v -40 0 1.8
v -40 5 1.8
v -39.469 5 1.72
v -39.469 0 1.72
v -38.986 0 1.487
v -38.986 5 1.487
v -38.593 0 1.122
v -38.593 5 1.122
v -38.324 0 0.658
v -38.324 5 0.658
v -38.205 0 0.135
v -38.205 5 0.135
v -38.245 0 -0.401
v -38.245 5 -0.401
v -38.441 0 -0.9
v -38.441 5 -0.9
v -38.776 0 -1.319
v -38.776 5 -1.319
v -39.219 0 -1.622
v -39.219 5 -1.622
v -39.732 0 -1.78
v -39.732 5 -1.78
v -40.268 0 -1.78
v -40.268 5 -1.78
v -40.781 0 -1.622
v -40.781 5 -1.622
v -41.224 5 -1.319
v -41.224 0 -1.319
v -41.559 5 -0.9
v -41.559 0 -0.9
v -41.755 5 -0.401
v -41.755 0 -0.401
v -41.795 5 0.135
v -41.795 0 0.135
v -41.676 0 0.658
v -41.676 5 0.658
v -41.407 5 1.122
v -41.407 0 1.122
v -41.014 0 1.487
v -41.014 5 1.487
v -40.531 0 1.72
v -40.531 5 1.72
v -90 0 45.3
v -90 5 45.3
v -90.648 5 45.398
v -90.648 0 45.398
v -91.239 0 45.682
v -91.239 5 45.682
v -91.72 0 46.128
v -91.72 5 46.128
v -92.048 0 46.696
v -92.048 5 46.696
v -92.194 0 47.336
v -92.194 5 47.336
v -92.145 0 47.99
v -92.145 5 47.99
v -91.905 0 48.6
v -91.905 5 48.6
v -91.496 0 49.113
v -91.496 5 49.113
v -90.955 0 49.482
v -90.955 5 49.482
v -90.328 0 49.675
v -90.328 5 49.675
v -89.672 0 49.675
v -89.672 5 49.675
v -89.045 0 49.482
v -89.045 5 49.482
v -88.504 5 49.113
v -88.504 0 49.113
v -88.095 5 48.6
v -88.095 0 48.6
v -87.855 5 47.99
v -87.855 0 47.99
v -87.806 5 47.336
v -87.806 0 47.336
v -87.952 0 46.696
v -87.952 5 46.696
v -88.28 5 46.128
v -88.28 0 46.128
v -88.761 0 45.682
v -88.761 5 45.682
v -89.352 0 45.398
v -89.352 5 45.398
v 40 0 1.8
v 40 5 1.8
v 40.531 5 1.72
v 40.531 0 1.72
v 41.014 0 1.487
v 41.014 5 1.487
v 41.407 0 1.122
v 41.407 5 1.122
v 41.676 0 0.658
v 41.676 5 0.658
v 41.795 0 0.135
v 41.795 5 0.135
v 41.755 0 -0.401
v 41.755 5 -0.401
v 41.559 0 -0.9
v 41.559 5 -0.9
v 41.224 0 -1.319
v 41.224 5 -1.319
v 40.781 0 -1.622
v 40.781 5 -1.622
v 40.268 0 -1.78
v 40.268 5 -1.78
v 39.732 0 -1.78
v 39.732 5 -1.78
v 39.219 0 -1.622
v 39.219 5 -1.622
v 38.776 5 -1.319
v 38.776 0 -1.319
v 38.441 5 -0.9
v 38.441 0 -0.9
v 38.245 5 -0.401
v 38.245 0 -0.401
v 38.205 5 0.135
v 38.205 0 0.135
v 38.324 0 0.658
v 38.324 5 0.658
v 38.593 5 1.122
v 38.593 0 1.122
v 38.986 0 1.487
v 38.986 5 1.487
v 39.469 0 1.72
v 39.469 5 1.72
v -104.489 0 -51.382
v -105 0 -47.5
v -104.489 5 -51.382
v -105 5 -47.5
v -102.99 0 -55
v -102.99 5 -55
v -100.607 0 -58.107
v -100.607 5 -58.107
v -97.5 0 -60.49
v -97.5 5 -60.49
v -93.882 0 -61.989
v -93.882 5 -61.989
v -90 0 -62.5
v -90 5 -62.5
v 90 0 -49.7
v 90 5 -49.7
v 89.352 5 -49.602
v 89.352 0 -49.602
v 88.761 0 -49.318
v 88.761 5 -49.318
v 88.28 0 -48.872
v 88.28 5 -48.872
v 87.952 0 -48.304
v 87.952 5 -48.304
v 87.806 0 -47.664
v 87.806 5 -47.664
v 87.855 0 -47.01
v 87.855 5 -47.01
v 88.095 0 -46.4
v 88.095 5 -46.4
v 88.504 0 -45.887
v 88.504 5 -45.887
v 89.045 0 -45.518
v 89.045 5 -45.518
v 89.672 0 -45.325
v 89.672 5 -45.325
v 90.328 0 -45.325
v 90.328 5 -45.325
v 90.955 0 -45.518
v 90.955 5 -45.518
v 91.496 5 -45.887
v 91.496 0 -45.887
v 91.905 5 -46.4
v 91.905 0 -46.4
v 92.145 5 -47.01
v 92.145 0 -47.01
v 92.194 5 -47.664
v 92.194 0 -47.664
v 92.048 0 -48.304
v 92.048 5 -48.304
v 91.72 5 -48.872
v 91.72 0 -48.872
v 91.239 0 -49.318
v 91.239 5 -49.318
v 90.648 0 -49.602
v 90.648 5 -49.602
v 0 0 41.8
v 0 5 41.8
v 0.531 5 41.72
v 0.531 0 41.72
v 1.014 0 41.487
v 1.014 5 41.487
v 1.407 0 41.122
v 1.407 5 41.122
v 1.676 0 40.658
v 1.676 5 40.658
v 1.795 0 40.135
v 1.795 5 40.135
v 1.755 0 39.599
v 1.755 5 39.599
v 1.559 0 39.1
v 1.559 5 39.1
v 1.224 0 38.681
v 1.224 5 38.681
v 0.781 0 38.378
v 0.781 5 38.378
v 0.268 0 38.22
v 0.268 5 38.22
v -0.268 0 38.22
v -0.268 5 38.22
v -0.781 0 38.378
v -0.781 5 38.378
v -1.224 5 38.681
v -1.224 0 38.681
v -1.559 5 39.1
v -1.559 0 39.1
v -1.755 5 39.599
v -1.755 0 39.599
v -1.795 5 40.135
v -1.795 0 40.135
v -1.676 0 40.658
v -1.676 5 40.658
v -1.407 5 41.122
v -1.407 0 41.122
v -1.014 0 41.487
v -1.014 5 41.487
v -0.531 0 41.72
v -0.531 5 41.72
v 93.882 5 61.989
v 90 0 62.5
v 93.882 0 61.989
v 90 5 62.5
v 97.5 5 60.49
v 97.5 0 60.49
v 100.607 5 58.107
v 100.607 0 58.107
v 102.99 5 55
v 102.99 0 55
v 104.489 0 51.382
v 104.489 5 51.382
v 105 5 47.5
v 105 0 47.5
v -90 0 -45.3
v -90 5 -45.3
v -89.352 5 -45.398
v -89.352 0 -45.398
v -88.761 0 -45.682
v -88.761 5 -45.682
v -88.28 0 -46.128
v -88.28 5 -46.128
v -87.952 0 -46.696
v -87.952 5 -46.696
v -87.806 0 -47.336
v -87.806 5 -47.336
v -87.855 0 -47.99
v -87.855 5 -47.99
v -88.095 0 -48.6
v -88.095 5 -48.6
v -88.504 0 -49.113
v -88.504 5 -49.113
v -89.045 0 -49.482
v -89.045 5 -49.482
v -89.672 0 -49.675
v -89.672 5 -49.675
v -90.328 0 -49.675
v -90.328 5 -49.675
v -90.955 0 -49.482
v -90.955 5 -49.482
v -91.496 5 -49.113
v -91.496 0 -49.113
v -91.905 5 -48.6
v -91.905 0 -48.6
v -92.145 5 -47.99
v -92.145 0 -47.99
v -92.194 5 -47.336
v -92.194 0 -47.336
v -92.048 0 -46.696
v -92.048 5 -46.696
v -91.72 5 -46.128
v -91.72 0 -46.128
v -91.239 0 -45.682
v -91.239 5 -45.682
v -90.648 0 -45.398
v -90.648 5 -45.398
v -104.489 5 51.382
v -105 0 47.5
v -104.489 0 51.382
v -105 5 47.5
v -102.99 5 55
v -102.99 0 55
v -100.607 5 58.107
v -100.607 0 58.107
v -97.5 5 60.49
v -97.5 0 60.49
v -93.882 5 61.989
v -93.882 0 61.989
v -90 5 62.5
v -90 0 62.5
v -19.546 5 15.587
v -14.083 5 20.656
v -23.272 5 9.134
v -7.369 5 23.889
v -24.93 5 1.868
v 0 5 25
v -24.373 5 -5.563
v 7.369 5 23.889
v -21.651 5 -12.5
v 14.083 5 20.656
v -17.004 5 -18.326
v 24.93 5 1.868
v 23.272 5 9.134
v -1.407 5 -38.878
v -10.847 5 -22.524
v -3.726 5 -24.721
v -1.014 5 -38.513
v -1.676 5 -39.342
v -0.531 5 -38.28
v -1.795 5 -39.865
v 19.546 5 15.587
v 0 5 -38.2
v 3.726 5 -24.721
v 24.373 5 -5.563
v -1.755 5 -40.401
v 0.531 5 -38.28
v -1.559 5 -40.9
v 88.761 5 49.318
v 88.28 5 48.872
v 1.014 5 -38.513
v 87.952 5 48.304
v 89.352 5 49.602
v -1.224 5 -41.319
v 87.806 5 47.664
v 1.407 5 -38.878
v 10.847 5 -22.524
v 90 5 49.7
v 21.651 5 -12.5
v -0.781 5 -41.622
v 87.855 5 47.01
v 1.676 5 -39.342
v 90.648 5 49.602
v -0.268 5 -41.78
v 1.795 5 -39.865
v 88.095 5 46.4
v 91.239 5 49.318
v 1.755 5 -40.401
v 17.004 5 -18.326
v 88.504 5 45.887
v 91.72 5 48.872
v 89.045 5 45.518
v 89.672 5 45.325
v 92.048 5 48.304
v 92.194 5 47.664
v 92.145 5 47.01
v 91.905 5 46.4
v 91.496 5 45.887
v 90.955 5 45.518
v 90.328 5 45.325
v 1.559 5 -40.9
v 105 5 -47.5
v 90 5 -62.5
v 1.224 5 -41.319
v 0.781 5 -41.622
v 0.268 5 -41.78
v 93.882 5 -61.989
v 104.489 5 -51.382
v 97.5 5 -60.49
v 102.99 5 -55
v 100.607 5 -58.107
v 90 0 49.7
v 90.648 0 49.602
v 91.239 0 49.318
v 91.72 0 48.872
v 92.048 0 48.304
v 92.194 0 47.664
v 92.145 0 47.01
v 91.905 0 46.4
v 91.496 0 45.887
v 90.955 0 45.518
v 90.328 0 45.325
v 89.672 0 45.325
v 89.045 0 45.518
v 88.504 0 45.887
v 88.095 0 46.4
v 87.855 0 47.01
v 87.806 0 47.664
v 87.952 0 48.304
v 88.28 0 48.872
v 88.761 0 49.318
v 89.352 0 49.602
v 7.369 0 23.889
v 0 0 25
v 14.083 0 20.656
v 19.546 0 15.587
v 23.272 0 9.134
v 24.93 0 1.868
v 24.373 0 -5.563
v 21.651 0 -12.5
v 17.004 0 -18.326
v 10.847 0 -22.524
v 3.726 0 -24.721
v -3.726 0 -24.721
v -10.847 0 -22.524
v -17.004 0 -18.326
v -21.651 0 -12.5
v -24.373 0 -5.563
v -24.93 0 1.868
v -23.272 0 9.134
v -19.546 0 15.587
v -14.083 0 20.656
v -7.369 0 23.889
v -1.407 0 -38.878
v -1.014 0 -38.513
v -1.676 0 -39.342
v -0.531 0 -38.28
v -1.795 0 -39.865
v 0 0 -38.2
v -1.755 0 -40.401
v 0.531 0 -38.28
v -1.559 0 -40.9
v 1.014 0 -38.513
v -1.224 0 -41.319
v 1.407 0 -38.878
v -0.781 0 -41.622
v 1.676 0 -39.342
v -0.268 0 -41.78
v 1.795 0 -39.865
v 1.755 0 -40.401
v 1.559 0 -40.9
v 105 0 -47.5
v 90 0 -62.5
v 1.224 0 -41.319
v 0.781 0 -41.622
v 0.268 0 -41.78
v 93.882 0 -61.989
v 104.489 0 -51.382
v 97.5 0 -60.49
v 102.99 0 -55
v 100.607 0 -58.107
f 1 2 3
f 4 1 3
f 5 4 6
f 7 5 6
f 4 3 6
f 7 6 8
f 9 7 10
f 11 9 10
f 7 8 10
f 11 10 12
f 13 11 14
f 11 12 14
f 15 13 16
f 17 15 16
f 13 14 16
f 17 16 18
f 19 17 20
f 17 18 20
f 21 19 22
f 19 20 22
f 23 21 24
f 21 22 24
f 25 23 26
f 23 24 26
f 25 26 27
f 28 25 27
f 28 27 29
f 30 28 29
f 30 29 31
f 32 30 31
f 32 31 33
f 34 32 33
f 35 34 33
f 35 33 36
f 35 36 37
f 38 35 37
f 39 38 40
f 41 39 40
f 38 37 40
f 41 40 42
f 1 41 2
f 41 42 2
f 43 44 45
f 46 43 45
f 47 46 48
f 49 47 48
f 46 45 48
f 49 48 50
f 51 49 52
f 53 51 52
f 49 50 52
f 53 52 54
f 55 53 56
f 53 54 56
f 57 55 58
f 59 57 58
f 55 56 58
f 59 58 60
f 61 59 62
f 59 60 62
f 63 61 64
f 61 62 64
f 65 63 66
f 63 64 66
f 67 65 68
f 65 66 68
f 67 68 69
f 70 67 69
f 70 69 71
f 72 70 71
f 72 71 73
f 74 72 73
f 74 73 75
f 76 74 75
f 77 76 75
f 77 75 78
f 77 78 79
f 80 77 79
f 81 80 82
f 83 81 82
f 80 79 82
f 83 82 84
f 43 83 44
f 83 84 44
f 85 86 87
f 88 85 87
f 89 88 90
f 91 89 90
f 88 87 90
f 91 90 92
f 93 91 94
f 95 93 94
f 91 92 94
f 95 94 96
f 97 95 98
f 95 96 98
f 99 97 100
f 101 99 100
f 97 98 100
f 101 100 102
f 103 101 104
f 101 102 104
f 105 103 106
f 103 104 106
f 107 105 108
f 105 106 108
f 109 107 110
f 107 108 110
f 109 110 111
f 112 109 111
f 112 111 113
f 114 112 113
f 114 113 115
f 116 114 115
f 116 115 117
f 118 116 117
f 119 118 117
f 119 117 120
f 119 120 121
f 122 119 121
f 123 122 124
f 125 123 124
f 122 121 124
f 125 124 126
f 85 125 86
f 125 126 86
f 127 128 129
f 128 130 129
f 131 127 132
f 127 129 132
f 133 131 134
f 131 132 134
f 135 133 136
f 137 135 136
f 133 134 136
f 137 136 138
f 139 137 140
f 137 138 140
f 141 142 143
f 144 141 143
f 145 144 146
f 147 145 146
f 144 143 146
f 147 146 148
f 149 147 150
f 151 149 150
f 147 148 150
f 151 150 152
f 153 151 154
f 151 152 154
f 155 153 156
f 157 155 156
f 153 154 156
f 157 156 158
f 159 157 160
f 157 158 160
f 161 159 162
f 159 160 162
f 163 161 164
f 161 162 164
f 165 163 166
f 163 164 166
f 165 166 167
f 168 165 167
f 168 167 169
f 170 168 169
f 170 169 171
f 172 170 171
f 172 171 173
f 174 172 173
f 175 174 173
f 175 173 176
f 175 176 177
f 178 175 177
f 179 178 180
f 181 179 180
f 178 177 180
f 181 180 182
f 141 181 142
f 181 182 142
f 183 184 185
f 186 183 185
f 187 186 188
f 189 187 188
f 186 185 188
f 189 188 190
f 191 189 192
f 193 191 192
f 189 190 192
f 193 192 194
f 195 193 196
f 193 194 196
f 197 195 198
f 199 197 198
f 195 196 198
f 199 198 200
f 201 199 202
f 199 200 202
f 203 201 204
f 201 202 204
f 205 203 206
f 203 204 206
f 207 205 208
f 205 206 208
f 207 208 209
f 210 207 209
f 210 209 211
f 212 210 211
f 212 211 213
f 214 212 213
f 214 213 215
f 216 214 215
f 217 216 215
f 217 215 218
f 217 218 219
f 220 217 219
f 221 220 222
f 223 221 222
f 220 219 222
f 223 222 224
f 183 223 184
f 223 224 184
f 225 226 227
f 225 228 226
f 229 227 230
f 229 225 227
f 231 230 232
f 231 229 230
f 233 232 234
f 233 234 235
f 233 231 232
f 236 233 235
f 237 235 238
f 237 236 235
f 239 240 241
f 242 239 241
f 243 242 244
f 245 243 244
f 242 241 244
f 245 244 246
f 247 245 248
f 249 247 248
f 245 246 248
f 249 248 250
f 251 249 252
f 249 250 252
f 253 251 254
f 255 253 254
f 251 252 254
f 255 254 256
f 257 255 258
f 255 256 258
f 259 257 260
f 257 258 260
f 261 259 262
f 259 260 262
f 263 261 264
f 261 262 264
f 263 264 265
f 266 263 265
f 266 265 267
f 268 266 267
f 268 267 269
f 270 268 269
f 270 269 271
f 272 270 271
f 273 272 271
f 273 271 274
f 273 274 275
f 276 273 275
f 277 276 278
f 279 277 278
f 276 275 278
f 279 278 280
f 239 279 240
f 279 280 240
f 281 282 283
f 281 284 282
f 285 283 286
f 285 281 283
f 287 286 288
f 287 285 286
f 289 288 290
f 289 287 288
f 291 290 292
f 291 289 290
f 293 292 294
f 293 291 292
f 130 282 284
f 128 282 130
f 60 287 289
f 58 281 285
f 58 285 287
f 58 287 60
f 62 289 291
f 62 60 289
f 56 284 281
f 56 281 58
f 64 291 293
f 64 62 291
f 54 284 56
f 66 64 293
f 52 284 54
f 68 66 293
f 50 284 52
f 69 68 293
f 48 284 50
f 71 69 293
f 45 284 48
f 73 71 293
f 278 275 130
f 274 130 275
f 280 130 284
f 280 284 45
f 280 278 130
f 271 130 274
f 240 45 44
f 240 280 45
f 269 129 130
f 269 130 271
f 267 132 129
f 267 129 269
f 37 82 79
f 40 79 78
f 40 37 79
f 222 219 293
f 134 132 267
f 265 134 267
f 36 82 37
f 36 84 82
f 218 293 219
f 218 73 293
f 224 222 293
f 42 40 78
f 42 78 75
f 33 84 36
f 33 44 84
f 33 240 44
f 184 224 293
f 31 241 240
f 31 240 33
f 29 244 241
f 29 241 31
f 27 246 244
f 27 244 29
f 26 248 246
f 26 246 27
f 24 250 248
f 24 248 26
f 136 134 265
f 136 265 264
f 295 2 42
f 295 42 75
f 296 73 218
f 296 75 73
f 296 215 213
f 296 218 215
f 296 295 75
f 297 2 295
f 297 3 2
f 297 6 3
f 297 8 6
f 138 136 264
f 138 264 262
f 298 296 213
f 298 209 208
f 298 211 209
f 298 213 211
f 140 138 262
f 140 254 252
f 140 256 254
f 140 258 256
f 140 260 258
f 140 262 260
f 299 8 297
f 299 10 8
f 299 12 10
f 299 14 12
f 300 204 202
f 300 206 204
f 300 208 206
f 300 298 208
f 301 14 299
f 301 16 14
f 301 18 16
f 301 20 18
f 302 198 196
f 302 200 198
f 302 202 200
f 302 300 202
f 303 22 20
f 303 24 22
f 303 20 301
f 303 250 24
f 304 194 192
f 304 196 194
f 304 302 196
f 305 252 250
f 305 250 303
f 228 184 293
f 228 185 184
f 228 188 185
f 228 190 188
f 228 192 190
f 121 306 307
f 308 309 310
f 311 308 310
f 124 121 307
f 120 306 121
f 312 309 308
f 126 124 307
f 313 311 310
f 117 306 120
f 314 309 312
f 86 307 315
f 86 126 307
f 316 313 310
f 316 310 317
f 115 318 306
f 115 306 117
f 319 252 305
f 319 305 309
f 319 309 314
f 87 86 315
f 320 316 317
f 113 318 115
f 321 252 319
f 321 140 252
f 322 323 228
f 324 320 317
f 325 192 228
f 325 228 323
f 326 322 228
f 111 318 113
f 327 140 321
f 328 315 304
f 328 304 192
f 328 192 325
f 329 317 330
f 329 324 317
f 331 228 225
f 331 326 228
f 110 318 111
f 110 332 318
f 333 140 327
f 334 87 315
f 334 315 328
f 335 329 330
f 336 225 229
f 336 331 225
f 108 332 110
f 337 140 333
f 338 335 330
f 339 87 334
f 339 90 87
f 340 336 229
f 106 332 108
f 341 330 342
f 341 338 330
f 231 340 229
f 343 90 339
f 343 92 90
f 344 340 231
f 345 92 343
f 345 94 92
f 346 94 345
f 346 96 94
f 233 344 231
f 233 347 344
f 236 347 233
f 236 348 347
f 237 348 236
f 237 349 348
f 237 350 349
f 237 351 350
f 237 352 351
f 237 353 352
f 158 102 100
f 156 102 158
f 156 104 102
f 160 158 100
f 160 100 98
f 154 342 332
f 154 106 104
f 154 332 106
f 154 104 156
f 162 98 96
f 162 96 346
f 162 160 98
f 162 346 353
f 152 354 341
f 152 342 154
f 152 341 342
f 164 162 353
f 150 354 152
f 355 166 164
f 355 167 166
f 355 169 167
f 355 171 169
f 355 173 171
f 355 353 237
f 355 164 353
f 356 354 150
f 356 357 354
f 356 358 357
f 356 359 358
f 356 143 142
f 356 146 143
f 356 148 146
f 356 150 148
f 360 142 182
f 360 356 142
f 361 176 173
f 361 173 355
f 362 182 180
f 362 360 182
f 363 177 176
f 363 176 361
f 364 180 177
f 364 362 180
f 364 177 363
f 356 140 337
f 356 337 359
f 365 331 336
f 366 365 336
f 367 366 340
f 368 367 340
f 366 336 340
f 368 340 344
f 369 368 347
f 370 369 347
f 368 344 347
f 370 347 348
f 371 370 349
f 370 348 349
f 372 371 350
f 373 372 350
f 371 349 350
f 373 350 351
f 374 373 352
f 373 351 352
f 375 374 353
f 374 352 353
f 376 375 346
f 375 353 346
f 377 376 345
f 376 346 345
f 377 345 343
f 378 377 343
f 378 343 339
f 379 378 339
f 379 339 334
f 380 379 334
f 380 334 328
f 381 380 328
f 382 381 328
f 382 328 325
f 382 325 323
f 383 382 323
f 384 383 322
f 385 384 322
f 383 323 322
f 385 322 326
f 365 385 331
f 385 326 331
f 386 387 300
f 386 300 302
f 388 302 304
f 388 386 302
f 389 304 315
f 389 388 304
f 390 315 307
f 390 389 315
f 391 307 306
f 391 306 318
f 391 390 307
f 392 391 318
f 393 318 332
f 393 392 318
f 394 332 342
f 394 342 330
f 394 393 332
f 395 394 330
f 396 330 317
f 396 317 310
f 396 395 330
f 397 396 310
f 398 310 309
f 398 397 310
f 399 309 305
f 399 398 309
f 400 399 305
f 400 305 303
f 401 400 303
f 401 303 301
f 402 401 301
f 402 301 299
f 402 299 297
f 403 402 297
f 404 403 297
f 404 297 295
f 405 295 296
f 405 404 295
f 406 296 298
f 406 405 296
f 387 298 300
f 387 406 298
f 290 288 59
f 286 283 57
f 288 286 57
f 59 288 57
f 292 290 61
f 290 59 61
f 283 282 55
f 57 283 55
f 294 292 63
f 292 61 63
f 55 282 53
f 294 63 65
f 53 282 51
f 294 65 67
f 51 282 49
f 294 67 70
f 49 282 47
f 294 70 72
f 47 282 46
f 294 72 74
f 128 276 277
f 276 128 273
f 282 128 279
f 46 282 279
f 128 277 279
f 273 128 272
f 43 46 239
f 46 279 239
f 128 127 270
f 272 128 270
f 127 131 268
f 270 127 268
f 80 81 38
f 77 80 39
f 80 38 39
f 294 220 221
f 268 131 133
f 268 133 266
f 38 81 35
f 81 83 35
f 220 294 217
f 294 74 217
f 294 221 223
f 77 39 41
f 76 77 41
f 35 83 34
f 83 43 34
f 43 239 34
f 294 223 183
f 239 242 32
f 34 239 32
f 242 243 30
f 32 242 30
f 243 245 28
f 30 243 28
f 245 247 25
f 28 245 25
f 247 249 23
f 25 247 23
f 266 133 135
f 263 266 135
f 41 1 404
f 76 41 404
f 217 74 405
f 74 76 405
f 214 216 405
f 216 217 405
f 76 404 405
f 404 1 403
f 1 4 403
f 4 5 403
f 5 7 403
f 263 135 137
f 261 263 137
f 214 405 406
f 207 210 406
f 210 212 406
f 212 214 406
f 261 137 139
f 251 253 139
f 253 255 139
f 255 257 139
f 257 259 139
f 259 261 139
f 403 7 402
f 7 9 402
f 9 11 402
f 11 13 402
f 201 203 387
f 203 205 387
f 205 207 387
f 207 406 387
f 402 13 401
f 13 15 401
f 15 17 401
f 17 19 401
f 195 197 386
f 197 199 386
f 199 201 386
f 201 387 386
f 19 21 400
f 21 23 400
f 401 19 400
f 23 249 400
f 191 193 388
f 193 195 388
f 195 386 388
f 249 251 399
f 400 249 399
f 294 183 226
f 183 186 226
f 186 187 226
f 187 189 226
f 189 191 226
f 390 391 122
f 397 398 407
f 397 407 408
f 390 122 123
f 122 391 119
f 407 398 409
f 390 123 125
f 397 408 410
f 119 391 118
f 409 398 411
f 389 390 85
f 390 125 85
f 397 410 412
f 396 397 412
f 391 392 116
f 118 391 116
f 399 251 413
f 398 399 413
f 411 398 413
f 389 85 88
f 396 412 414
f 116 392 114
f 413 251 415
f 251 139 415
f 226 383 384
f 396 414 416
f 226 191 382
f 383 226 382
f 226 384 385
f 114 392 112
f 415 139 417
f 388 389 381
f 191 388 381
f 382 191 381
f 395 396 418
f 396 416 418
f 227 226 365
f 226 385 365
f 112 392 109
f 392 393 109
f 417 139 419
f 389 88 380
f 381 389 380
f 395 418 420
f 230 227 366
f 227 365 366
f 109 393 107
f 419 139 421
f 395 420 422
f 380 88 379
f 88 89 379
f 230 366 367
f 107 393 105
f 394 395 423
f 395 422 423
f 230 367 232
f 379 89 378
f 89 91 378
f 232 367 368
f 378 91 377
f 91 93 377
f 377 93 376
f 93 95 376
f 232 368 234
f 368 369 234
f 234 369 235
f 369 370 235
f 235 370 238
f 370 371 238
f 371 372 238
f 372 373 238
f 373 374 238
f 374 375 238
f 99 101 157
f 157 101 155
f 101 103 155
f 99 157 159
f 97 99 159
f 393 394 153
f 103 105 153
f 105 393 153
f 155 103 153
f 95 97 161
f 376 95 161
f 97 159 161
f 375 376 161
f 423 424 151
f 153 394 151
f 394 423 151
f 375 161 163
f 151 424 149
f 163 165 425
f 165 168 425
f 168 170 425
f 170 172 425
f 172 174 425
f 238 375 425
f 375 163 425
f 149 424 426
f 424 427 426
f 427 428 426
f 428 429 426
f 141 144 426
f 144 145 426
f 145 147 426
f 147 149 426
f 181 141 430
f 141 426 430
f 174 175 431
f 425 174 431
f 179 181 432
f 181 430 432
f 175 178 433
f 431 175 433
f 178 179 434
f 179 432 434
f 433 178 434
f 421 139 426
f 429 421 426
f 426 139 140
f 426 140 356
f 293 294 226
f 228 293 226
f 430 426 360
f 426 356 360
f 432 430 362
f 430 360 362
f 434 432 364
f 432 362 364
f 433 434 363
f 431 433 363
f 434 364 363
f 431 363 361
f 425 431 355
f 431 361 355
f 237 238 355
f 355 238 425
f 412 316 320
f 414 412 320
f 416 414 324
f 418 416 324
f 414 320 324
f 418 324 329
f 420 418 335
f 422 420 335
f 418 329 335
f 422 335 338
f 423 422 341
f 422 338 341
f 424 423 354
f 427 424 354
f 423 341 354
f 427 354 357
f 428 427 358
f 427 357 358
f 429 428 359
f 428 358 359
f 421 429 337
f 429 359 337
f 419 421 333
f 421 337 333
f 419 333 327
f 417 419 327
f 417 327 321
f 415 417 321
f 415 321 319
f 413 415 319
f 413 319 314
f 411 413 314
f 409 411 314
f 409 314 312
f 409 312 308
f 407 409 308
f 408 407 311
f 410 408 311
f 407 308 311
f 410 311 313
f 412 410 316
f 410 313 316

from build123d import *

# Parameters (mm, degrees)
SKETCH_1_R          = 60
SKETCH_1_R_2        = 25
EXTRUDE_1_DEPTH     = 5
SKETCH_2_R          = 1.8
CUT_EXTRUDE_1_DEPTH = 5
SKETCH_4_W          = 210
SKETCH_4_H          = 125
SKETCH_4_R          = 60
EXTRUDE_2_DEPTH     = 5
SKETCH_5_R          = 2.2
CUT_EXTRUDE_2_DEPTH = 5
FILLET_1_R          = 15


with BuildPart() as part:
    # 草图1 → 凸台-拉伸1 (new body)
    with BuildSketch(Plane(origin=(0, 0, 0), x_dir=(1, 0, 0), z_dir=(0, 1, 0))):
        with Locations(Location((0, 0, 0), (0, 0, 270))):
            Circle(SKETCH_1_R)
        with Locations(Location((0, 0, 0), (0, 0, 270))):
            Circle(SKETCH_1_R_2, mode=Mode.SUBTRACT)
    extrude(amount=EXTRUDE_1_DEPTH)

    # 草图2 → 切除-拉伸1 (cut)
    with BuildSketch(Plane(origin=(0, 5, 0), x_dir=(1, 0, 0), z_dir=(0, 1, 0))):
        with Locations(Location((0, 40, 0), (0, 0, 270))):
            Circle(SKETCH_2_R)
        with Locations(Location((40, 0, 0), (0, 0, 270))):
            Circle(SKETCH_2_R)
        with Locations(Location((0, -40, 0), (0, 0, 270))):
            Circle(SKETCH_2_R)
        with Locations(Location((-40, 0, 0), (0, 0, 270))):
            Circle(SKETCH_2_R)
    extrude(amount=-CUT_EXTRUDE_1_DEPTH, mode=Mode.SUBTRACT)

    # 草图4 → 凸台-拉伸2 (add)
    with BuildSketch(Plane(origin=(0, 0, 0), x_dir=(1, 0, 0), z_dir=(0, 1, 0))):
        Rectangle(SKETCH_4_W, SKETCH_4_H)
        Circle(SKETCH_4_R, mode=Mode.SUBTRACT)
    extrude(amount=EXTRUDE_2_DEPTH)

    # 草图5 → 切除-拉伸2 (cut)
    with BuildSketch(Plane(origin=(0, 5, 0), x_dir=(1, 0, 0), z_dir=(0, 1, 0))):
        with Locations(Location((-90, 47.5, 0), (0, 0, 270))):
            Circle(SKETCH_5_R)
        with Locations(Location((90, 47.5, 0), (0, 0, 90))):
            Circle(SKETCH_5_R)
        with Locations(Location((90, -47.5, 0), (0, 0, 270))):
            Circle(SKETCH_5_R)
        with Locations(Location((-90, -47.5, 0), (0, 0, 90))):
            Circle(SKETCH_5_R)
    extrude(amount=-CUT_EXTRUDE_2_DEPTH, mode=Mode.SUBTRACT)

    # 圆角1
    fillet_1_edges = [part.edges().sort_by_distance(p)[0] for p in [
        (-105, 2.5, -62.5),
        (-105, 2.5, 62.5),
        (105, 2.5, 62.5),
        (105, 2.5, -62.5),
    ]]
    fillet(fillet_1_edges, radius=FILLET_1_R)


solid = part.part
